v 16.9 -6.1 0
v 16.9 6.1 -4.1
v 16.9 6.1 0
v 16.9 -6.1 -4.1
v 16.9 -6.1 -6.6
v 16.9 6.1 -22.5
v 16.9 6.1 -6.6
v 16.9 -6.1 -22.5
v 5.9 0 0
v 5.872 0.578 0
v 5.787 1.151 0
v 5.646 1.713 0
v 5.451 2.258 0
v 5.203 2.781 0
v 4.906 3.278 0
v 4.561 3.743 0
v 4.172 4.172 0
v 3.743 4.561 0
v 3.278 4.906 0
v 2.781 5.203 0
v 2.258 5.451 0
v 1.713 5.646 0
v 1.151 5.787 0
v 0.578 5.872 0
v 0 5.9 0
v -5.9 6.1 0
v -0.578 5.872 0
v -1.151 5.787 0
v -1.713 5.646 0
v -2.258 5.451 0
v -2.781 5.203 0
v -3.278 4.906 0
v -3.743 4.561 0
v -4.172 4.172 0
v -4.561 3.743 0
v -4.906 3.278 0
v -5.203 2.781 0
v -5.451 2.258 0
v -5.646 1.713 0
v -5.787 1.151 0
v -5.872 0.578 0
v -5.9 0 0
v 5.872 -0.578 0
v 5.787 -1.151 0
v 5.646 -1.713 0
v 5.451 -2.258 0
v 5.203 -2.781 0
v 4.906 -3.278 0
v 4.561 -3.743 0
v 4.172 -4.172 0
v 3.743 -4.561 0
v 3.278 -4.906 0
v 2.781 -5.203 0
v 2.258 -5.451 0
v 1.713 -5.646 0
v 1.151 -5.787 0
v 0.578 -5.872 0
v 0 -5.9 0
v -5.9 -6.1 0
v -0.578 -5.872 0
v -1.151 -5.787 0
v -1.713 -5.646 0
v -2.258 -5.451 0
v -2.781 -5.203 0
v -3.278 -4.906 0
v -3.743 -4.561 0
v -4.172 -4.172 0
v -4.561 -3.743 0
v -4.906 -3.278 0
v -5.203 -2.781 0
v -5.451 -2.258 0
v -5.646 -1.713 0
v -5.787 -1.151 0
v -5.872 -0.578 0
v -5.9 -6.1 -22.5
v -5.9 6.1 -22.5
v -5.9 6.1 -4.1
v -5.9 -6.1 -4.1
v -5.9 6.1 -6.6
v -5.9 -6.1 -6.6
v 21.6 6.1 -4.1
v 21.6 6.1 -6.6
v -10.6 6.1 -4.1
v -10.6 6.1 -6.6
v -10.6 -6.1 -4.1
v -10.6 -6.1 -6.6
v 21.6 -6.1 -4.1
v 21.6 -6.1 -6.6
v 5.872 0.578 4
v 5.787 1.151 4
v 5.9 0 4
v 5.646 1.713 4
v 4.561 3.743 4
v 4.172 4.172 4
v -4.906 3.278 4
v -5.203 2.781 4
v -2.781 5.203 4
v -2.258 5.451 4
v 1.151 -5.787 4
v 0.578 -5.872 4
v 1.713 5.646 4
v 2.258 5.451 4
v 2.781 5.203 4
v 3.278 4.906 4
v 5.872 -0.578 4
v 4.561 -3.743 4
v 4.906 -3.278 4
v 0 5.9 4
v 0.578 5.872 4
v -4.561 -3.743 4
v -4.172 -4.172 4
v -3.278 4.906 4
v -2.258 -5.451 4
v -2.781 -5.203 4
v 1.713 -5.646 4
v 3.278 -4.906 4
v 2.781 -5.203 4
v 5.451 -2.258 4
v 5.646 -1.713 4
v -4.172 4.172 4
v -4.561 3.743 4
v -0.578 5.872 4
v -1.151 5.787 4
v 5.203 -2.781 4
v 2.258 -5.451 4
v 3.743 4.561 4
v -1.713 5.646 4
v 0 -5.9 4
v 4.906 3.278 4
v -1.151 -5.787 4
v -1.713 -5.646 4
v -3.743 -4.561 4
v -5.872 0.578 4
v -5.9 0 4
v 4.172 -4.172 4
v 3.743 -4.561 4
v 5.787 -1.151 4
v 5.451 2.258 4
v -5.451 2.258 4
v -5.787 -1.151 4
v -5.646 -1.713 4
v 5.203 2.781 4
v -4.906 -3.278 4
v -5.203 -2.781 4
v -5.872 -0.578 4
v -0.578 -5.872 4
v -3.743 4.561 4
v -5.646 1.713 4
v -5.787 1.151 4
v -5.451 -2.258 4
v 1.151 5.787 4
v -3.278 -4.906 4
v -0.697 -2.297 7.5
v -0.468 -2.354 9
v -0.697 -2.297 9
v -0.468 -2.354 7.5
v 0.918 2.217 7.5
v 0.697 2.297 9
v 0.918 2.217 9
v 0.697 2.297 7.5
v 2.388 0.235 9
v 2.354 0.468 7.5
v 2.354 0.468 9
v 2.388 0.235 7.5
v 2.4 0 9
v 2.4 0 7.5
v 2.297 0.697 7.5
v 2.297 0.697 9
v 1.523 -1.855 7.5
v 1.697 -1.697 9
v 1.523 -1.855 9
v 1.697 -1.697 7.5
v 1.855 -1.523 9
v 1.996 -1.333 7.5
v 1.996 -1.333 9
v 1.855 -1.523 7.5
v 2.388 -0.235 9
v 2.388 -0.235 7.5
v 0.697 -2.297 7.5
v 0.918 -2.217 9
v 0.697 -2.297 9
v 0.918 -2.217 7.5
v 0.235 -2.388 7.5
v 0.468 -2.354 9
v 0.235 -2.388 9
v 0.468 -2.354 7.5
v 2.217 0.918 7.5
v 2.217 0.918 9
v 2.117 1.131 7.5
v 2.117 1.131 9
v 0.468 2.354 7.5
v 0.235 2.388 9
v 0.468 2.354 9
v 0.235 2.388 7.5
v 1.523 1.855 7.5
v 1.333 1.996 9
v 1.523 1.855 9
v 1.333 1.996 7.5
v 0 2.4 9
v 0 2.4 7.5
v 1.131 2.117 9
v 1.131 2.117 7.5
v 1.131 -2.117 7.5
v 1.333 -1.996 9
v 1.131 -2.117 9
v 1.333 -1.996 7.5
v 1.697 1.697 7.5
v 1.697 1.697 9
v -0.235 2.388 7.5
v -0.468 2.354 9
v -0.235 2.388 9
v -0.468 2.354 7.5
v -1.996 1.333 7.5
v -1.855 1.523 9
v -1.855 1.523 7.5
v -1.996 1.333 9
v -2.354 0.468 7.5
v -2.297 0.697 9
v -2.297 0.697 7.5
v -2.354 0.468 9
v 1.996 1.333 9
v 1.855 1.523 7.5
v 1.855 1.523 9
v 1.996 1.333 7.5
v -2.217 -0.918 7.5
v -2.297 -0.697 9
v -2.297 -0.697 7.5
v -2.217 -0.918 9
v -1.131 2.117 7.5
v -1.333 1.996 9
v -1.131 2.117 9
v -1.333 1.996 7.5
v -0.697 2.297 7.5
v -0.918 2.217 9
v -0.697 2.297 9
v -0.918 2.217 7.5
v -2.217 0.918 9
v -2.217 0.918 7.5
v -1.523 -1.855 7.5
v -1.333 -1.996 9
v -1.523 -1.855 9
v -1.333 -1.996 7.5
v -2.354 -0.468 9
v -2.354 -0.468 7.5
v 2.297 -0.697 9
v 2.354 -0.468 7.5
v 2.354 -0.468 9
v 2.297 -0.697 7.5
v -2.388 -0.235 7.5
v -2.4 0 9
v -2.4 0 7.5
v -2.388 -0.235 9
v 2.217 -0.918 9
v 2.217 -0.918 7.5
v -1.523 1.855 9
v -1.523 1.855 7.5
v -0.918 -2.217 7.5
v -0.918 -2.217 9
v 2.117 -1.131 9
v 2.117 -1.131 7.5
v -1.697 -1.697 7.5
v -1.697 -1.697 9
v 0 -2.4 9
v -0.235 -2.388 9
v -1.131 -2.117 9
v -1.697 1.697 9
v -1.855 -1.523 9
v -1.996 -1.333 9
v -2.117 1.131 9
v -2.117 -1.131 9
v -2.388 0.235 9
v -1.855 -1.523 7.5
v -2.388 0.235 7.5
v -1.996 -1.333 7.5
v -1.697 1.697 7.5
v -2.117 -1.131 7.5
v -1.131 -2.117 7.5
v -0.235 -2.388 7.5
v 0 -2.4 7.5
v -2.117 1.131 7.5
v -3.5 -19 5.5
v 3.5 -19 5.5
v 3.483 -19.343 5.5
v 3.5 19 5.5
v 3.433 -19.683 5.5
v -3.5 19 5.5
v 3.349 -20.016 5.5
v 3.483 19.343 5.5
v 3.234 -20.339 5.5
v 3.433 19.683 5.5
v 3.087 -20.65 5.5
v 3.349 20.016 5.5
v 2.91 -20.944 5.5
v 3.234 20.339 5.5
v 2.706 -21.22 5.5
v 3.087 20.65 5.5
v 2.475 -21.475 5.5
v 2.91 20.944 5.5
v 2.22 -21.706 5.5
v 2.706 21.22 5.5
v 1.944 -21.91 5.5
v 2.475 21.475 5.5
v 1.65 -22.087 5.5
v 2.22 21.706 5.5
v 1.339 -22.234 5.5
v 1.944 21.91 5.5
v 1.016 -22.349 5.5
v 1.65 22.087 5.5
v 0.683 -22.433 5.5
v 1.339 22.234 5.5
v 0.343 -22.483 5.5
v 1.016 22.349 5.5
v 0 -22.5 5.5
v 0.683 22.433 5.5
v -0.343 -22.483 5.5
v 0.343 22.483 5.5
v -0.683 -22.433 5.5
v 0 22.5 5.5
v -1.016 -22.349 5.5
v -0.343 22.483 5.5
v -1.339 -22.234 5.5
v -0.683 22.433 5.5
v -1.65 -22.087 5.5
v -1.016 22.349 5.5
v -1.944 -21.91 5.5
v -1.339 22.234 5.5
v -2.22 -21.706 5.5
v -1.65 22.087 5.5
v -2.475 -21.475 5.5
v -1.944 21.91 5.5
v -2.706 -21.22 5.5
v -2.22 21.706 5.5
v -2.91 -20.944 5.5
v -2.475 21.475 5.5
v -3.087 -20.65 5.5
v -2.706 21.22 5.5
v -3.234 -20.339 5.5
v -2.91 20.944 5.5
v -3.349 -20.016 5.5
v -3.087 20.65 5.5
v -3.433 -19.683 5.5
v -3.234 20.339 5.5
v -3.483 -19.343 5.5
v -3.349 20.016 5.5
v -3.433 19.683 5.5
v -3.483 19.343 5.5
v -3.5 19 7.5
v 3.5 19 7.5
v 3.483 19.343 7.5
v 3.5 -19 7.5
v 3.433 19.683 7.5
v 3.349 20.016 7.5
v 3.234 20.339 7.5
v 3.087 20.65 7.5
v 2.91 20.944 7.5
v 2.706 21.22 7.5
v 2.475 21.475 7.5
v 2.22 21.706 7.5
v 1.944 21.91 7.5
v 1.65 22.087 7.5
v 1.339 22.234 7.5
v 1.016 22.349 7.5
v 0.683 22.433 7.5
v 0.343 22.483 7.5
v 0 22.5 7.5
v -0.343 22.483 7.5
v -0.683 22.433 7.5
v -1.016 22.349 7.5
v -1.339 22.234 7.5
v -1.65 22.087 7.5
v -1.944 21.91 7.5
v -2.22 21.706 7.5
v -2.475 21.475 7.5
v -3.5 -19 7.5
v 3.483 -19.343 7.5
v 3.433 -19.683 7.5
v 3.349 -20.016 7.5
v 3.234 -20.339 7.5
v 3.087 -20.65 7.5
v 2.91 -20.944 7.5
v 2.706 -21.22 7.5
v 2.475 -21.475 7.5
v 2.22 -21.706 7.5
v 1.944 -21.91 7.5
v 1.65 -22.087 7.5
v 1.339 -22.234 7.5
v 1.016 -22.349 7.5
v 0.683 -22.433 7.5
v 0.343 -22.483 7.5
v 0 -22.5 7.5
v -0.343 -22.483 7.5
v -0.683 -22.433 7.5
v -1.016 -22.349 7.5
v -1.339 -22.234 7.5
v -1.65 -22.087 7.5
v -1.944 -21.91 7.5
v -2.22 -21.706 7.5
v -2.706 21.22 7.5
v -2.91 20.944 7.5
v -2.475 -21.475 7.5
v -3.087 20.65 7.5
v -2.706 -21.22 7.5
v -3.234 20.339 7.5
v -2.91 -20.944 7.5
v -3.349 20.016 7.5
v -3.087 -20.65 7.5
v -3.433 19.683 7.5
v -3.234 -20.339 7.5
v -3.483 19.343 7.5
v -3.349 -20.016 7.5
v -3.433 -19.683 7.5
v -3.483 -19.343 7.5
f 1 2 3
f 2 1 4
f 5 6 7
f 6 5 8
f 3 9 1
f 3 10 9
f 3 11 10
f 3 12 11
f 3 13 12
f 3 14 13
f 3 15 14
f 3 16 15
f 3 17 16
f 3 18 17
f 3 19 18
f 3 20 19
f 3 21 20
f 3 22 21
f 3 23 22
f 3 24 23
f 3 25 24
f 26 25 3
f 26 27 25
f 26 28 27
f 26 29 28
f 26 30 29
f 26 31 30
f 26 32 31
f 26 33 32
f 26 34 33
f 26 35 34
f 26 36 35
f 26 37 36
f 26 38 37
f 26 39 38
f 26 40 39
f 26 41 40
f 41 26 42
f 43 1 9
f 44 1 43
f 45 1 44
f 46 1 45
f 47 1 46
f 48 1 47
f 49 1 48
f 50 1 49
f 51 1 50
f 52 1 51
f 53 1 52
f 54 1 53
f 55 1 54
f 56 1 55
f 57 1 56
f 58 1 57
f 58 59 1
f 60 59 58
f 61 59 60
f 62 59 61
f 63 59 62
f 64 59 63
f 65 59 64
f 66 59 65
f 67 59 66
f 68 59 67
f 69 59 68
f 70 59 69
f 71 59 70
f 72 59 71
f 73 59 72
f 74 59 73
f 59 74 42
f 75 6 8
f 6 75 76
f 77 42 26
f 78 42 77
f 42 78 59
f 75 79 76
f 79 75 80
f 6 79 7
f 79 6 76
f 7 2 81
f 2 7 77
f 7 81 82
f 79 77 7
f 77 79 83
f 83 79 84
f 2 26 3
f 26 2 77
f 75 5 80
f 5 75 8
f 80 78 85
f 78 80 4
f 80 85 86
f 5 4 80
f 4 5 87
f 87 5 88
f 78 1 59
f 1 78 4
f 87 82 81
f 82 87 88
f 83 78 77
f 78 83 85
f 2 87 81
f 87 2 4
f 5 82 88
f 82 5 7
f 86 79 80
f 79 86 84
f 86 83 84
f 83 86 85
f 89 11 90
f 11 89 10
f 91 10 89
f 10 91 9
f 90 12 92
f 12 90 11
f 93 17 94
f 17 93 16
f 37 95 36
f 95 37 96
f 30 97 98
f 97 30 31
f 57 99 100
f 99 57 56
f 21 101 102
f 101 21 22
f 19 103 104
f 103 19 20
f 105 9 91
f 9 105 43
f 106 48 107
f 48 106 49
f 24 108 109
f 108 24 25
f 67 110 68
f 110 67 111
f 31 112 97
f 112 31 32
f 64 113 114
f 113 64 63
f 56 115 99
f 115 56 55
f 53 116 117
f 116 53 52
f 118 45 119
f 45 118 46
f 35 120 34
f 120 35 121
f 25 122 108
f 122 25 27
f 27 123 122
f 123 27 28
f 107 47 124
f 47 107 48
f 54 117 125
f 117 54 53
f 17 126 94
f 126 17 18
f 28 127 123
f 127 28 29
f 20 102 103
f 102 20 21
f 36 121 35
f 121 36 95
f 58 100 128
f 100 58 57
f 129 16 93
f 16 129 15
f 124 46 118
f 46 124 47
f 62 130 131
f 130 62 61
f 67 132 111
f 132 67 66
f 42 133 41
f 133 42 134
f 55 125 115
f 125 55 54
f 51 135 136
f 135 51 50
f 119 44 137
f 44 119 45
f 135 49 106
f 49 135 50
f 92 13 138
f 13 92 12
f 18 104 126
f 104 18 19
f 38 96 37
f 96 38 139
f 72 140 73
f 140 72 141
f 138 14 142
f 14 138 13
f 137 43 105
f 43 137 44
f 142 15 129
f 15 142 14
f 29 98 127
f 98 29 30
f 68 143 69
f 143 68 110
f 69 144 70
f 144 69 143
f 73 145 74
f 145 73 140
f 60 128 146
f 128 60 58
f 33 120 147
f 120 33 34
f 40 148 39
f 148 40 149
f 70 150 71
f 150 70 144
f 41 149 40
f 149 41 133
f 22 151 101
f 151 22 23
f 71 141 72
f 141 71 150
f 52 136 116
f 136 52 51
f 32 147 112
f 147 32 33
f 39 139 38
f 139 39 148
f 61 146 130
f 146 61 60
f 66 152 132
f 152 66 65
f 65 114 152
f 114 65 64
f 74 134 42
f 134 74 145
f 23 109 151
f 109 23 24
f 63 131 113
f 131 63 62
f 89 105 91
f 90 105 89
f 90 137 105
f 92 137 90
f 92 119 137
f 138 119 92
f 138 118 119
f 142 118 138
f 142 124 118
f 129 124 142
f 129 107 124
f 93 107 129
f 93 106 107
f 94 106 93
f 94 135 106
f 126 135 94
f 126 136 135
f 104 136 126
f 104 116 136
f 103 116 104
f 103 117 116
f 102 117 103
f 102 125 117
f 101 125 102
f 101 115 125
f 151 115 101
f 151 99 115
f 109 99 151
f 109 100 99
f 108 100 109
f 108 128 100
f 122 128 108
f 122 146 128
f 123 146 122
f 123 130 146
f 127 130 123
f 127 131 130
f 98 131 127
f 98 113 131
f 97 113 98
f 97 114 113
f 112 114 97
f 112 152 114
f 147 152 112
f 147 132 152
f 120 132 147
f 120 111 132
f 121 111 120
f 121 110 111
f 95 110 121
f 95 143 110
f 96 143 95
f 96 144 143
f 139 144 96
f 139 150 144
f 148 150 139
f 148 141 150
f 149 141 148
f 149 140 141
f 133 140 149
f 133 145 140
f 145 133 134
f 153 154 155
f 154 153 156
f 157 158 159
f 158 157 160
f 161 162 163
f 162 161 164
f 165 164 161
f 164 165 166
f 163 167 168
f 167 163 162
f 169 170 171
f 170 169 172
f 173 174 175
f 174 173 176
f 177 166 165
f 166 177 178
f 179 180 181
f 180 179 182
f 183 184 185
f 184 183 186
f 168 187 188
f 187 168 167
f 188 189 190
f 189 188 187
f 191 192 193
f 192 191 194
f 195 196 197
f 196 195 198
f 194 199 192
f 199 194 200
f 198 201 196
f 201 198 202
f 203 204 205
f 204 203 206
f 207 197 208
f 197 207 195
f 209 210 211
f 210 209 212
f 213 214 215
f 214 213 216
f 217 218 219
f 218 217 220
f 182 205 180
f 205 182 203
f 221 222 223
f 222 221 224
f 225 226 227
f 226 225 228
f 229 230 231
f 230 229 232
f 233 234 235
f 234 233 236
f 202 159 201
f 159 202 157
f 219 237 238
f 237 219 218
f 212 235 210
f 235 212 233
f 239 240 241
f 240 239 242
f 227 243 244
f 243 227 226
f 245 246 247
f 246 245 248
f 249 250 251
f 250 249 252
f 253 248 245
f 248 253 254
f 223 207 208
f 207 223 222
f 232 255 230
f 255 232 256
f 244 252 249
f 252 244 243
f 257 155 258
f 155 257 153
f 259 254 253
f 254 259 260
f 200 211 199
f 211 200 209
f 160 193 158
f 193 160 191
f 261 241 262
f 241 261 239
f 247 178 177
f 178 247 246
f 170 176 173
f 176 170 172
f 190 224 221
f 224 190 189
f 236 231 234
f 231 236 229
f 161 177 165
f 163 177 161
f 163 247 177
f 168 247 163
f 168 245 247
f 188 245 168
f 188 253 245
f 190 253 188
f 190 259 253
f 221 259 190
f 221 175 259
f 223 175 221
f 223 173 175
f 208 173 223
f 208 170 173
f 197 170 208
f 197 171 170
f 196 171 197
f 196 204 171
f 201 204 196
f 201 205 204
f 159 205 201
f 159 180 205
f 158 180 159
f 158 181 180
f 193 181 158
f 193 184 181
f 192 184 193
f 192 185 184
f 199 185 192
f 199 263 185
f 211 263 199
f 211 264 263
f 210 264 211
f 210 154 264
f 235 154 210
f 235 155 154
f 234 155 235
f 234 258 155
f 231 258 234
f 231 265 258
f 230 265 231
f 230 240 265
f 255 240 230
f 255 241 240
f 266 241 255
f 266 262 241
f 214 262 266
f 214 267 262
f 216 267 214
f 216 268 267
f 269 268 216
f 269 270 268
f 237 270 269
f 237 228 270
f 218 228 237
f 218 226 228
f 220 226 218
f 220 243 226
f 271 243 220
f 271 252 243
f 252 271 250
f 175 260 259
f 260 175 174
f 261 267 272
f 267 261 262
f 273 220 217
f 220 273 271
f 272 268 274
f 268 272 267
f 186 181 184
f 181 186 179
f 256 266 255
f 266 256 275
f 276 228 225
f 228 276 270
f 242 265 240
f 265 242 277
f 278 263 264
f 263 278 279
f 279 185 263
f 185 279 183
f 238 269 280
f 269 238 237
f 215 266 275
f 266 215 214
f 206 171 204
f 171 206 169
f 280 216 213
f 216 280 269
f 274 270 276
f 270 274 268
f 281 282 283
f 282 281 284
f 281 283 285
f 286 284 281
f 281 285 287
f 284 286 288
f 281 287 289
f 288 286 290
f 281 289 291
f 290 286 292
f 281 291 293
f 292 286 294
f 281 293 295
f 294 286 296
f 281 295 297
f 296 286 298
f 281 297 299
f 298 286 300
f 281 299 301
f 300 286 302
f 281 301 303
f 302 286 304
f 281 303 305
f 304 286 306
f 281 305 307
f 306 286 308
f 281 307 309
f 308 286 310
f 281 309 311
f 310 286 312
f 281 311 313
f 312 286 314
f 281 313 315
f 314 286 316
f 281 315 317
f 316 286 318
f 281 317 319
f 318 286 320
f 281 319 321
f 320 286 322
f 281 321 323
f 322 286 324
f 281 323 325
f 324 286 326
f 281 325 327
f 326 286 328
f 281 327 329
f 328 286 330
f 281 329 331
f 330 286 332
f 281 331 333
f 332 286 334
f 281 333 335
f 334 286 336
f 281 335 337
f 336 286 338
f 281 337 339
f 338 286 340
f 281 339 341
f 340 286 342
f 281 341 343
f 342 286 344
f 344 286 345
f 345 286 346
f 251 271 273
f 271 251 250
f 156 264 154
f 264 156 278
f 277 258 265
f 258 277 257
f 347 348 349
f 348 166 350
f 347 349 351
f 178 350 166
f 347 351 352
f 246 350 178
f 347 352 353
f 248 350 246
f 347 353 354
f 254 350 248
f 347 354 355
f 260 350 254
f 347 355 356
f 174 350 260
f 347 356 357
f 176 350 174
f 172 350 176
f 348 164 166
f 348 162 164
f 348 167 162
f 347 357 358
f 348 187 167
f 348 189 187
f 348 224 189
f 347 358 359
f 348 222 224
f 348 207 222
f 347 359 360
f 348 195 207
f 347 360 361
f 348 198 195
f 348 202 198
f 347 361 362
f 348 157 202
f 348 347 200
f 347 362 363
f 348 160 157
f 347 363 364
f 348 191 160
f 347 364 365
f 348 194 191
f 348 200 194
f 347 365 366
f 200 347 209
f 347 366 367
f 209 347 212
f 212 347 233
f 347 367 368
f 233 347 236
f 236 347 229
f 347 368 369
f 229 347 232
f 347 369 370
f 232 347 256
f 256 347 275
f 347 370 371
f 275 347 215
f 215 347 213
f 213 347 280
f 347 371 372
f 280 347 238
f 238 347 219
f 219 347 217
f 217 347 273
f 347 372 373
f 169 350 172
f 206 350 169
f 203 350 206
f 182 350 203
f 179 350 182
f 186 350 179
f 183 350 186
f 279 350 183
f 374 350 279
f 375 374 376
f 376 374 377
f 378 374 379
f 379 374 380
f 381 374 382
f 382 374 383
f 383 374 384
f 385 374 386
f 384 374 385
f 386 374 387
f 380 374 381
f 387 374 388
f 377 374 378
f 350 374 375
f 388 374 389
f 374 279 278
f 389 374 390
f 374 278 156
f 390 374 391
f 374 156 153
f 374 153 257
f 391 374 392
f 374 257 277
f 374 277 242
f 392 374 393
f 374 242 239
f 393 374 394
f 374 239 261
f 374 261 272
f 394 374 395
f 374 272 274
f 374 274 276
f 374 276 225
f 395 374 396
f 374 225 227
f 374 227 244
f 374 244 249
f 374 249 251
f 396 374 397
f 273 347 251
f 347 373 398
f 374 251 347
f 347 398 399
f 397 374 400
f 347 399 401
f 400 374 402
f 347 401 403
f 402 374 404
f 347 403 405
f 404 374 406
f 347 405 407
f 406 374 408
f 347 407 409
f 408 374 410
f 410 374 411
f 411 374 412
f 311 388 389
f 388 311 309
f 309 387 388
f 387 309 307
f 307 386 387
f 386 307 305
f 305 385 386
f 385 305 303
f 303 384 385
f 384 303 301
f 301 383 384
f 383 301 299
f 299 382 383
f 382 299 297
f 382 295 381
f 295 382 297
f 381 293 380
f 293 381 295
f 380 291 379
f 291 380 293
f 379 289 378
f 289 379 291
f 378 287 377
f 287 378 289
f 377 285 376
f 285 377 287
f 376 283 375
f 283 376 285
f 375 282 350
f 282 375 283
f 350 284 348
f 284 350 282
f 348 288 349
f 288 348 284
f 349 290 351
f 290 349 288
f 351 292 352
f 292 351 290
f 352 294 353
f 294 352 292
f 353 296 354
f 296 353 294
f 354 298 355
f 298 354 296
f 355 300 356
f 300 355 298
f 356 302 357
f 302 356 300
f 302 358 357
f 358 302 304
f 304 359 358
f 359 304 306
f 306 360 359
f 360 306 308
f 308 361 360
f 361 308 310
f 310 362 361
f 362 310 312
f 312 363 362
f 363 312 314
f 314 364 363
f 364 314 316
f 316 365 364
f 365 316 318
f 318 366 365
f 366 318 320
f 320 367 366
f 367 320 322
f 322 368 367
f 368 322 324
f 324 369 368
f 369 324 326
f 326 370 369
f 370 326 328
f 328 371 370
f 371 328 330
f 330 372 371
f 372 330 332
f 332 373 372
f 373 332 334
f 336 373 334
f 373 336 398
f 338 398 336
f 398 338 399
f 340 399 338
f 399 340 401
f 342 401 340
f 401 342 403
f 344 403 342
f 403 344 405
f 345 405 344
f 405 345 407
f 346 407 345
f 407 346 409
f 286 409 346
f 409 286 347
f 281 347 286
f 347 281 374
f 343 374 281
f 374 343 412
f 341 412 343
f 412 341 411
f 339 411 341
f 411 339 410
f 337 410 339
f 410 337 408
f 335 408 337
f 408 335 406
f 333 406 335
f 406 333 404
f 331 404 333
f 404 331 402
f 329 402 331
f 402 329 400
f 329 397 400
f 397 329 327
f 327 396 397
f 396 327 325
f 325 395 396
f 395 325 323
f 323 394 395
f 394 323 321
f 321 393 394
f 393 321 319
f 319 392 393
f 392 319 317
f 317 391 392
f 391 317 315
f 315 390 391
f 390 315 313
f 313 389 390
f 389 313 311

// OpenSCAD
include <parameters.scad>

// Envelope de referência de um microservo SG90 e do seu braço de plástico.
// Não é peça para imprimir: serve para conferir encaixe e curso.
//
// A origem fica no eixo de saída, sobre a face superior da carcaça, com o
// eixo apontando para +Z.

module servo_sg90(show_horn = true) {
    // Carcaça.
    color("royalblue")
        translate([
            -servo_shaft_from_end,
            -servo_body_width / 2,
            -servo_body_height
        ])
            cube([servo_body_length, servo_body_width, servo_body_height]);

    // Abas de fixação.
    color("royalblue")
        translate([
            -servo_shaft_from_end - (servo_flange_length - servo_body_length) / 2,
            -servo_body_width / 2,
            -servo_body_height + servo_flange_z
        ])
            cube([servo_flange_length, servo_body_width, servo_flange_thickness]);

    // Cubo e eixo estriado.
    color("white") cylinder(d = servo_boss_diameter, h = servo_boss_height);
    color("white")
        translate([0, 0, servo_shaft_height - servo_horn_thickness])
            cylinder(
                d = servo_shaft_diameter,
                h = servo_shaft_height - servo_boss_height
            );

    if (show_horn) servo_horn();
}

// Braço plástico de duas pontas que vem com o servo. Fica encaixado no
// rebaixo do servo_stick e gira junto com ele.
module servo_horn() {
    color("gainsboro")
        translate([0, 0, servo_shaft_height - servo_horn_thickness])
            linear_extrude(height = servo_horn_thickness)
                difference() {
                    hull() {
                        for (y = [-servo_horn_length / 2, servo_horn_length / 2])
                            translate([0, y])
                                circle(d = servo_horn_end_diameter);
                    }
                    circle(d = servo_shaft_diameter);
                }
}

// Microswitch preso na face interna da lateral direita da gaiola, nos dois
// furos que já existem na peça. A origem fica no meio dos dois furos, com o
// corpo avançando para dentro do vão (-X) e o comprimento em Z.
// pressed = true desenha a alavanca acionada pelo pino do alvo.
module microswitch(pressed = false) {
    angle = pressed ? switch_lever_pressed_angle : switch_lever_free_angle;

    color("black")
        translate([-switch_thickness, -switch_width / 2, -switch_length / 2])
            cube([switch_thickness, switch_width, switch_length]);

    // Terminais.
    color("silver")
        for (z = [-6, 0, 6])
            translate([-switch_thickness + 1, switch_width / 2, z - 1.5])
                cube([1.5, 4, 3]);

    // Alavanca articulada na ponta inferior, descendo até o dente do alvo.
    color("silver")
        translate([-switch_thickness / 2, -switch_width / 2, -switch_length / 2])
            rotate([angle, 0, 0])
                translate([-2, -switch_lever_length, -0.5])
                    cube([4, switch_lever_length, 0.6]);
}

servo_sg90();
